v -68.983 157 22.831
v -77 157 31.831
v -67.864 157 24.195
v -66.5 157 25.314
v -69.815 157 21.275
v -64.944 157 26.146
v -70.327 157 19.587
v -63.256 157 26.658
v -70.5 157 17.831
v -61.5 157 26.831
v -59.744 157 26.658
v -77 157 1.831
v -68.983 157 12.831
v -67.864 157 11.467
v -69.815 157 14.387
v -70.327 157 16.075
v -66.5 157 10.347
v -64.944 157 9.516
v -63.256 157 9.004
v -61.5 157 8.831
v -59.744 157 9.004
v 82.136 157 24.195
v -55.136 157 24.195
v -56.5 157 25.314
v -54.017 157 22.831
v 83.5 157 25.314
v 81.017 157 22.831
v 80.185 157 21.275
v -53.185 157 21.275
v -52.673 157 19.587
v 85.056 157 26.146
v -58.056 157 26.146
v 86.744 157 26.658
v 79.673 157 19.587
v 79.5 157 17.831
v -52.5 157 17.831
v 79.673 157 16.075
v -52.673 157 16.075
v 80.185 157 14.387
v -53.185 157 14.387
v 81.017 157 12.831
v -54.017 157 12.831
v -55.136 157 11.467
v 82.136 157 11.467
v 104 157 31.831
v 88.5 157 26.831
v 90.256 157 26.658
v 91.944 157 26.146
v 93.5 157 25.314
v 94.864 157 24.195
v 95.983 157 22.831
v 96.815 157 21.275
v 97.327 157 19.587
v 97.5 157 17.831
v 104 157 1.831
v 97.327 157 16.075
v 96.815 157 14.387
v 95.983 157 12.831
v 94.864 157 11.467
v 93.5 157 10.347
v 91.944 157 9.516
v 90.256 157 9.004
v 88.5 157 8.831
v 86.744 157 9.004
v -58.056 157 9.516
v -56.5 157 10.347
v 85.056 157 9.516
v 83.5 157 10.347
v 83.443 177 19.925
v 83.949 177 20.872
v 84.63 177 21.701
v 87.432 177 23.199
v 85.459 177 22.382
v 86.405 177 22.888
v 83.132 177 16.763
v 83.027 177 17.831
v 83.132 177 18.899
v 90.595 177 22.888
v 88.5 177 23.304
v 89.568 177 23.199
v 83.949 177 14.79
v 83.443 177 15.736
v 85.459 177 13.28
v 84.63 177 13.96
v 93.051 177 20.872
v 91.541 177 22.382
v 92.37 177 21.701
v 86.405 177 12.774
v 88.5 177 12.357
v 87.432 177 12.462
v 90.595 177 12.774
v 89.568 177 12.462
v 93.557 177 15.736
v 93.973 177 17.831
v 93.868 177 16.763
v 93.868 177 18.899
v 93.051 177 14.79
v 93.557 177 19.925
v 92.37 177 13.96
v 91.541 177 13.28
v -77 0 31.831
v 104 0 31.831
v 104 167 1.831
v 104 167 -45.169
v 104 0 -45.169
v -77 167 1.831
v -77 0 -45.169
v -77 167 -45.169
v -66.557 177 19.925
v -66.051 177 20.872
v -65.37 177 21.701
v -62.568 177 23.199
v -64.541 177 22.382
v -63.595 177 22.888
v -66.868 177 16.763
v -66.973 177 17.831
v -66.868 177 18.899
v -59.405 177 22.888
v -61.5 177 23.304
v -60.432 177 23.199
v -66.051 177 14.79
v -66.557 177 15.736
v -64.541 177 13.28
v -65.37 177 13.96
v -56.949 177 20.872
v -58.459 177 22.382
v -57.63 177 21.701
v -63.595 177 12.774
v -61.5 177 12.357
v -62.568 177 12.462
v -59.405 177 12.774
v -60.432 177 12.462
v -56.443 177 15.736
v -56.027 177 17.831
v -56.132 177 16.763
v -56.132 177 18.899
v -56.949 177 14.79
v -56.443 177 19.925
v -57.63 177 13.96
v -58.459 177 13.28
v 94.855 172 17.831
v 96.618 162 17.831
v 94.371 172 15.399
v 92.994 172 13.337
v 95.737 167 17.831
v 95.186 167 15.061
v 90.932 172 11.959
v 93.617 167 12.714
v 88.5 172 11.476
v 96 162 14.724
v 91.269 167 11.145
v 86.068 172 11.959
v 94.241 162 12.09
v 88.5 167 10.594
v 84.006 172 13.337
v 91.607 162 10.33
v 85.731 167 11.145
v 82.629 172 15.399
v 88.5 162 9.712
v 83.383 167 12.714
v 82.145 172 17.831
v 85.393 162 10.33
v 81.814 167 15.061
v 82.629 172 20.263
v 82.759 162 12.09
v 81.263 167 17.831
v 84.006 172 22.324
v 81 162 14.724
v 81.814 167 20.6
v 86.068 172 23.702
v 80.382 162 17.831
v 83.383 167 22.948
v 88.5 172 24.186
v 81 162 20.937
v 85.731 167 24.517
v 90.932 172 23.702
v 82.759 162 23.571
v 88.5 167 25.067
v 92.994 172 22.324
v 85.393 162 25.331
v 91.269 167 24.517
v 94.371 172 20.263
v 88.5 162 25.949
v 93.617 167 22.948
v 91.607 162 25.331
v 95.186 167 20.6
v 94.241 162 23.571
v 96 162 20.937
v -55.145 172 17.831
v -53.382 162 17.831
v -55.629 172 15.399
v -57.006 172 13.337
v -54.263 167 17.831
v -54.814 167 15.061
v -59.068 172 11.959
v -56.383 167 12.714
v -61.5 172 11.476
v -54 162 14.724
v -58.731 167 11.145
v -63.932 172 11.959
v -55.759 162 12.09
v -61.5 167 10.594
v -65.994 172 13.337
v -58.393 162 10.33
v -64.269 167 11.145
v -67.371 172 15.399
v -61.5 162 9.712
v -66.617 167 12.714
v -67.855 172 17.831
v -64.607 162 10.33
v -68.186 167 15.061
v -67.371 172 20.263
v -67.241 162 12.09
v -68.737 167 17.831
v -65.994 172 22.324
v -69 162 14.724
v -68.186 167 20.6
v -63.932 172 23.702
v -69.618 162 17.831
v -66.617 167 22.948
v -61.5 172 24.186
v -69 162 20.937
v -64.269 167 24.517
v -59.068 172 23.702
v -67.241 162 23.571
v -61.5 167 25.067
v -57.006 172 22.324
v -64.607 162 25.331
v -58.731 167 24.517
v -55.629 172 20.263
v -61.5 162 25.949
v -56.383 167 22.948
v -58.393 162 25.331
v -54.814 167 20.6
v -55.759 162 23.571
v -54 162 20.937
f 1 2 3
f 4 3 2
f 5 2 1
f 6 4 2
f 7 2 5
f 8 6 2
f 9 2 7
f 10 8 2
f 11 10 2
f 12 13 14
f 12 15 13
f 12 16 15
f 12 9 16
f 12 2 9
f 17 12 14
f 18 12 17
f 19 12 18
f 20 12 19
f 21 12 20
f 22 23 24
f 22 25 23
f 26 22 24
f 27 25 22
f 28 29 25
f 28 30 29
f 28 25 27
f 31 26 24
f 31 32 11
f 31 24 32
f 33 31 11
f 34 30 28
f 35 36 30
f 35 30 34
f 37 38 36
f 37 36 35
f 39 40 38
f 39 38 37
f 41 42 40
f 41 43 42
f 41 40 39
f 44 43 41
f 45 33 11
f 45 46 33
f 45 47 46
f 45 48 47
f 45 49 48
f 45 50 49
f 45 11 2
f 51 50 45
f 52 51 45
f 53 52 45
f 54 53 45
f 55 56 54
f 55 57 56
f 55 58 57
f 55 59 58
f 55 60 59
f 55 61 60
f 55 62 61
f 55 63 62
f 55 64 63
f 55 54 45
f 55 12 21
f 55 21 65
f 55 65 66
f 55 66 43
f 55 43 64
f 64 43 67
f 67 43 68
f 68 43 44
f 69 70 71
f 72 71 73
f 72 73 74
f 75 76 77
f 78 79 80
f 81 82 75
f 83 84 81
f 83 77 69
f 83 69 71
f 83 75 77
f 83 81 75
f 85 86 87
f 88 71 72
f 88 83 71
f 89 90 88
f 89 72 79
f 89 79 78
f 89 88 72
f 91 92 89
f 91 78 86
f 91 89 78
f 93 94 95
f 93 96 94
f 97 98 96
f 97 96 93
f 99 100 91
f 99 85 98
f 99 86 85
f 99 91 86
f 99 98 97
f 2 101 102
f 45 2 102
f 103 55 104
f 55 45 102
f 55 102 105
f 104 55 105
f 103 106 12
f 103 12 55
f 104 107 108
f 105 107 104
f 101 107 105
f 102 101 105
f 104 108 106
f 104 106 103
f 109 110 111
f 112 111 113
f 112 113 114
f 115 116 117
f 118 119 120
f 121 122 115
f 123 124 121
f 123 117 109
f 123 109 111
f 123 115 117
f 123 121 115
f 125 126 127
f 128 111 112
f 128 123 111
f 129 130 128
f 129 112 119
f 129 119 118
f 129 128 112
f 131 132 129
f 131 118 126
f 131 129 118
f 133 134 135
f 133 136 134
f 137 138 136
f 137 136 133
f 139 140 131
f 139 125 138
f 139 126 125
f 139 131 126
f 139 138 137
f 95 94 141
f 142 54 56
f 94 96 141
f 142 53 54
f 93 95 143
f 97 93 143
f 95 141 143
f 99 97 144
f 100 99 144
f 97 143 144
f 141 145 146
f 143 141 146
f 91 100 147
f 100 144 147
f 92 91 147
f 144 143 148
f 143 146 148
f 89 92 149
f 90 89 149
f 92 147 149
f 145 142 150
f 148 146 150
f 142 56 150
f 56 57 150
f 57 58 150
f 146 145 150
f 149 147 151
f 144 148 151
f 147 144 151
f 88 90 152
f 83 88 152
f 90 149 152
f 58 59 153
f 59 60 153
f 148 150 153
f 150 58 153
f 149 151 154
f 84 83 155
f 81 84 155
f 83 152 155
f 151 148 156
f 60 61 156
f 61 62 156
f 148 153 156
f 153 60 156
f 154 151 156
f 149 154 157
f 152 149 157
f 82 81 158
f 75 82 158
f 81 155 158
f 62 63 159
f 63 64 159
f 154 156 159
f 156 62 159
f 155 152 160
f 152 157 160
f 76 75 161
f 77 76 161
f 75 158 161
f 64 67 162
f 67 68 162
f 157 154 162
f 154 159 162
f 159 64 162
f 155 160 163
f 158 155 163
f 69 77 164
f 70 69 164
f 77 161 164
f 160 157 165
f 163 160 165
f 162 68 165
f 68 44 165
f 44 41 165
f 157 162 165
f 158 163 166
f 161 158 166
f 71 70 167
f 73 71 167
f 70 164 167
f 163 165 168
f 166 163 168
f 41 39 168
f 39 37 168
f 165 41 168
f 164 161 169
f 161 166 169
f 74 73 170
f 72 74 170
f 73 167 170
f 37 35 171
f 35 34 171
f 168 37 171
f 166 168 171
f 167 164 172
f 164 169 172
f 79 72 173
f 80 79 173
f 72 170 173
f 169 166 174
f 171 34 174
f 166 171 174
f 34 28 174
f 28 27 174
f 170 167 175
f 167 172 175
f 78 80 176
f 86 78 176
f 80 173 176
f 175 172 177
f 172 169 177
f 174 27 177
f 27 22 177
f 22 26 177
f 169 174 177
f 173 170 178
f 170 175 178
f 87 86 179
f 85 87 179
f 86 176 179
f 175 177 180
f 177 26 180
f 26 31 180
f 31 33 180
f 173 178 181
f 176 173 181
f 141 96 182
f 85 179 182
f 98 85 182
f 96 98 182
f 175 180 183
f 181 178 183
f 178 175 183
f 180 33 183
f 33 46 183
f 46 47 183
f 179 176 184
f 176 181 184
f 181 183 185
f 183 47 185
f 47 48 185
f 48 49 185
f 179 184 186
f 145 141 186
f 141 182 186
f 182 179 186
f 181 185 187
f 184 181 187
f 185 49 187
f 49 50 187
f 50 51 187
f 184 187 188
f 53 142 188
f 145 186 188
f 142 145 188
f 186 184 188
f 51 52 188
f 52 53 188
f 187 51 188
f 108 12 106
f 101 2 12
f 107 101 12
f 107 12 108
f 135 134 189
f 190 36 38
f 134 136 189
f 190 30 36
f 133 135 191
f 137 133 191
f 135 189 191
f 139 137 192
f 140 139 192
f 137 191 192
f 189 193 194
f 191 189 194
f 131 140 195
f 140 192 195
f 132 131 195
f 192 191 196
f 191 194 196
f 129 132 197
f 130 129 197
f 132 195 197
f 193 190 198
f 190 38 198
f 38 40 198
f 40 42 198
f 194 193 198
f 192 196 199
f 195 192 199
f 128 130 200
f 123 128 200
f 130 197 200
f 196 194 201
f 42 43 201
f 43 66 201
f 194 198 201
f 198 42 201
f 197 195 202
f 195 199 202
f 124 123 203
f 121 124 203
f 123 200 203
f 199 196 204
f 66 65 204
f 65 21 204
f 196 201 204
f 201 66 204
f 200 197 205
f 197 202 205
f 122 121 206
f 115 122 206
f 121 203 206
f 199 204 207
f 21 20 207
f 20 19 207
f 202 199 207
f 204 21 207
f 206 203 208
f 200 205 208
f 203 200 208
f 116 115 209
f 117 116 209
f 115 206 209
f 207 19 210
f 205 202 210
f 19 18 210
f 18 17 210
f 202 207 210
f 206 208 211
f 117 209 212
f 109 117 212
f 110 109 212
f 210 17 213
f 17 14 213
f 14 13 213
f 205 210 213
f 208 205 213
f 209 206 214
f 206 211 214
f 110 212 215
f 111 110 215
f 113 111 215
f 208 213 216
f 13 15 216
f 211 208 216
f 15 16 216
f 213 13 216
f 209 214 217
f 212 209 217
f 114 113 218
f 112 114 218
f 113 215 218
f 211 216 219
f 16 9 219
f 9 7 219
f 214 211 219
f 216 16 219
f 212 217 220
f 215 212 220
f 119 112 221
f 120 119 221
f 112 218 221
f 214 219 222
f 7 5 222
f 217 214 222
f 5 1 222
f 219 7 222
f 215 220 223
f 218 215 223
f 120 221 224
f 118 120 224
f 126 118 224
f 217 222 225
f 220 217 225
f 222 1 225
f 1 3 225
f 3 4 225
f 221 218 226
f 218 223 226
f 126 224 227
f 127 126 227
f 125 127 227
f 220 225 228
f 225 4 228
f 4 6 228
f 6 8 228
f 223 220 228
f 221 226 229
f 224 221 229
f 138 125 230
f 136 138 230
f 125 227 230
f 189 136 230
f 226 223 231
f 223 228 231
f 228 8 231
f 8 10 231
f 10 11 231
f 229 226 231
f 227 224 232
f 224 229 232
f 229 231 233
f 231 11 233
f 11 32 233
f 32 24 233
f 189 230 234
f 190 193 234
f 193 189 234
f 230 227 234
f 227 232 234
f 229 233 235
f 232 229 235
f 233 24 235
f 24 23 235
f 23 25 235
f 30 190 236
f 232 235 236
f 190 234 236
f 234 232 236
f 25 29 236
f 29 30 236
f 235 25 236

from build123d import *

# Parameters (mm, degrees)
ESBO_O1_W                          = 181
ESBO_O1_H                          = 77
RESSALTO_EXTRUS_O1_DEPTH           = 167
ESBO_O2_W                          = 181
ESBO_O2_H                          = 30
CORTE_EXTRUS_O1_DEPTH              = 10
ESBO_O3_R                          = 9
RESSALTO_EXTRUS_O2_DEPTH           = 20
RESSALTO_EXTRUS_O2_DRAFT           = 10
RESSALTO_EXTRUS_O2_PROFILE_2_DEPTH = 20
RESSALTO_EXTRUS_O2_PROFILE_2_DRAFT = 10


with BuildPart() as part:
    # Esboço1 → Ressalto-extrusão1 (new body)
    with BuildSketch(Plane(origin=(0, 0, 0), x_dir=(1, 0, 0), z_dir=(0, 1, 0))):
        with Locations((13.5, 6.669291339)):
            Rectangle(ESBO_O1_W, ESBO_O1_H)
    extrude(amount=RESSALTO_EXTRUS_O1_DEPTH)

    # Esboço2 → Corte-extrusão1 (cut)
    with BuildSketch(Plane(origin=(0, 167, 0), x_dir=(1, 0, 0), z_dir=(0, 1, 0))):
        with Locations((13.5, -16.830708661)):
            Rectangle(ESBO_O2_W, ESBO_O2_H)
    extrude(amount=-CORTE_EXTRUS_O1_DEPTH, mode=Mode.SUBTRACT)


with BuildPart() as ressalto_extrus_o2_tool:
    # Esboço3 → Ressalto-extrusão2 (with draft: the straight prism first)
    with BuildSketch(Plane(origin=(0, 157, 0), x_dir=(1, 0, 0), z_dir=(0, 1, 0))):
        with Locations((-61.5, -17.830708661)):
            Circle(ESBO_O3_R)
    extrude(amount=RESSALTO_EXTRUS_O2_DEPTH)
    # Ressalto-extrusão2: the draft: its side faces are tilted about the plane it starts from
    ressalto_extrus_o2_sides = [ressalto_extrus_o2_tool.faces().sort_by_distance(p)[0] for p in [
        (-70.5, 167, 17.830708661),
    ]]
    draft(ressalto_extrus_o2_sides, Plane(origin=(0, 157, 0), x_dir=(1, 0, 0), z_dir=(0, 1, 0)), RESSALTO_EXTRUS_O2_DRAFT)


with BuildPart() as part_1:
    add(part.part)

    # Ressalto-extrusão2: add ressalto_extrus_o2_tool
    add(ressalto_extrus_o2_tool.part)


with BuildPart() as ressalto_extrus_o2_profile_2_tool:
    # Esboço3 → Ressalto-extrusão2 profile 2 (with draft: the straight prism first)
    with BuildSketch(Plane(origin=(0, 157, 0), x_dir=(1, 0, 0), z_dir=(0, 1, 0))):
        with Locations((88.5, -17.830708661)):
            Circle(ESBO_O3_R)
    extrude(amount=RESSALTO_EXTRUS_O2_PROFILE_2_DEPTH)
    # Ressalto-extrusão2 profile 2: the draft: its side faces are tilted about the plane it starts from
    ressalto_extrus_o2_profile_2_sides = [ressalto_extrus_o2_profile_2_tool.faces().sort_by_distance(p)[0] for p in [
        (79.5, 167, 17.830708661),
    ]]
    draft(ressalto_extrus_o2_profile_2_sides, Plane(origin=(0, 157, 0), x_dir=(1, 0, 0), z_dir=(0, 1, 0)), RESSALTO_EXTRUS_O2_PROFILE_2_DRAFT)


with BuildPart() as part_2:
    add(part_1.part)

    # Ressalto-extrusão2 profile 2: add ressalto_extrus_o2_profile_2_tool
    add(ressalto_extrus_o2_profile_2_tool.part)


solid = part_2.part
